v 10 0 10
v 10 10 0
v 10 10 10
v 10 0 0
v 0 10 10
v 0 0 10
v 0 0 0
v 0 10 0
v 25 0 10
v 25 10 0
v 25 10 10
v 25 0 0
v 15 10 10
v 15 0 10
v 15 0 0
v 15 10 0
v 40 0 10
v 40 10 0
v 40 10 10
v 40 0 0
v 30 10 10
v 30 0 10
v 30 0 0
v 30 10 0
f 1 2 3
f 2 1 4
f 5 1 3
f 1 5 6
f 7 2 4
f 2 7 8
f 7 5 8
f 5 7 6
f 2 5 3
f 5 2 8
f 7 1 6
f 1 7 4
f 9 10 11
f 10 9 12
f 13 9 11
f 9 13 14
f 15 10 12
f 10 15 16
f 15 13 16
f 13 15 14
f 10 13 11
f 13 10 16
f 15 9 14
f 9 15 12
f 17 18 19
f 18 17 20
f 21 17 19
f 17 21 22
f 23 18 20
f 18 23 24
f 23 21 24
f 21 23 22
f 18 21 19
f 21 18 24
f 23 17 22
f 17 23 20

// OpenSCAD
// color(undef) must leave colors alone, like in preview (#5853).
color("green") cube(10);
color(undef) translate([15, 0, 0]) cube(10);                // default color
color(undef) translate([30, 0, 0]) color("red") cube(10);   // stays red
